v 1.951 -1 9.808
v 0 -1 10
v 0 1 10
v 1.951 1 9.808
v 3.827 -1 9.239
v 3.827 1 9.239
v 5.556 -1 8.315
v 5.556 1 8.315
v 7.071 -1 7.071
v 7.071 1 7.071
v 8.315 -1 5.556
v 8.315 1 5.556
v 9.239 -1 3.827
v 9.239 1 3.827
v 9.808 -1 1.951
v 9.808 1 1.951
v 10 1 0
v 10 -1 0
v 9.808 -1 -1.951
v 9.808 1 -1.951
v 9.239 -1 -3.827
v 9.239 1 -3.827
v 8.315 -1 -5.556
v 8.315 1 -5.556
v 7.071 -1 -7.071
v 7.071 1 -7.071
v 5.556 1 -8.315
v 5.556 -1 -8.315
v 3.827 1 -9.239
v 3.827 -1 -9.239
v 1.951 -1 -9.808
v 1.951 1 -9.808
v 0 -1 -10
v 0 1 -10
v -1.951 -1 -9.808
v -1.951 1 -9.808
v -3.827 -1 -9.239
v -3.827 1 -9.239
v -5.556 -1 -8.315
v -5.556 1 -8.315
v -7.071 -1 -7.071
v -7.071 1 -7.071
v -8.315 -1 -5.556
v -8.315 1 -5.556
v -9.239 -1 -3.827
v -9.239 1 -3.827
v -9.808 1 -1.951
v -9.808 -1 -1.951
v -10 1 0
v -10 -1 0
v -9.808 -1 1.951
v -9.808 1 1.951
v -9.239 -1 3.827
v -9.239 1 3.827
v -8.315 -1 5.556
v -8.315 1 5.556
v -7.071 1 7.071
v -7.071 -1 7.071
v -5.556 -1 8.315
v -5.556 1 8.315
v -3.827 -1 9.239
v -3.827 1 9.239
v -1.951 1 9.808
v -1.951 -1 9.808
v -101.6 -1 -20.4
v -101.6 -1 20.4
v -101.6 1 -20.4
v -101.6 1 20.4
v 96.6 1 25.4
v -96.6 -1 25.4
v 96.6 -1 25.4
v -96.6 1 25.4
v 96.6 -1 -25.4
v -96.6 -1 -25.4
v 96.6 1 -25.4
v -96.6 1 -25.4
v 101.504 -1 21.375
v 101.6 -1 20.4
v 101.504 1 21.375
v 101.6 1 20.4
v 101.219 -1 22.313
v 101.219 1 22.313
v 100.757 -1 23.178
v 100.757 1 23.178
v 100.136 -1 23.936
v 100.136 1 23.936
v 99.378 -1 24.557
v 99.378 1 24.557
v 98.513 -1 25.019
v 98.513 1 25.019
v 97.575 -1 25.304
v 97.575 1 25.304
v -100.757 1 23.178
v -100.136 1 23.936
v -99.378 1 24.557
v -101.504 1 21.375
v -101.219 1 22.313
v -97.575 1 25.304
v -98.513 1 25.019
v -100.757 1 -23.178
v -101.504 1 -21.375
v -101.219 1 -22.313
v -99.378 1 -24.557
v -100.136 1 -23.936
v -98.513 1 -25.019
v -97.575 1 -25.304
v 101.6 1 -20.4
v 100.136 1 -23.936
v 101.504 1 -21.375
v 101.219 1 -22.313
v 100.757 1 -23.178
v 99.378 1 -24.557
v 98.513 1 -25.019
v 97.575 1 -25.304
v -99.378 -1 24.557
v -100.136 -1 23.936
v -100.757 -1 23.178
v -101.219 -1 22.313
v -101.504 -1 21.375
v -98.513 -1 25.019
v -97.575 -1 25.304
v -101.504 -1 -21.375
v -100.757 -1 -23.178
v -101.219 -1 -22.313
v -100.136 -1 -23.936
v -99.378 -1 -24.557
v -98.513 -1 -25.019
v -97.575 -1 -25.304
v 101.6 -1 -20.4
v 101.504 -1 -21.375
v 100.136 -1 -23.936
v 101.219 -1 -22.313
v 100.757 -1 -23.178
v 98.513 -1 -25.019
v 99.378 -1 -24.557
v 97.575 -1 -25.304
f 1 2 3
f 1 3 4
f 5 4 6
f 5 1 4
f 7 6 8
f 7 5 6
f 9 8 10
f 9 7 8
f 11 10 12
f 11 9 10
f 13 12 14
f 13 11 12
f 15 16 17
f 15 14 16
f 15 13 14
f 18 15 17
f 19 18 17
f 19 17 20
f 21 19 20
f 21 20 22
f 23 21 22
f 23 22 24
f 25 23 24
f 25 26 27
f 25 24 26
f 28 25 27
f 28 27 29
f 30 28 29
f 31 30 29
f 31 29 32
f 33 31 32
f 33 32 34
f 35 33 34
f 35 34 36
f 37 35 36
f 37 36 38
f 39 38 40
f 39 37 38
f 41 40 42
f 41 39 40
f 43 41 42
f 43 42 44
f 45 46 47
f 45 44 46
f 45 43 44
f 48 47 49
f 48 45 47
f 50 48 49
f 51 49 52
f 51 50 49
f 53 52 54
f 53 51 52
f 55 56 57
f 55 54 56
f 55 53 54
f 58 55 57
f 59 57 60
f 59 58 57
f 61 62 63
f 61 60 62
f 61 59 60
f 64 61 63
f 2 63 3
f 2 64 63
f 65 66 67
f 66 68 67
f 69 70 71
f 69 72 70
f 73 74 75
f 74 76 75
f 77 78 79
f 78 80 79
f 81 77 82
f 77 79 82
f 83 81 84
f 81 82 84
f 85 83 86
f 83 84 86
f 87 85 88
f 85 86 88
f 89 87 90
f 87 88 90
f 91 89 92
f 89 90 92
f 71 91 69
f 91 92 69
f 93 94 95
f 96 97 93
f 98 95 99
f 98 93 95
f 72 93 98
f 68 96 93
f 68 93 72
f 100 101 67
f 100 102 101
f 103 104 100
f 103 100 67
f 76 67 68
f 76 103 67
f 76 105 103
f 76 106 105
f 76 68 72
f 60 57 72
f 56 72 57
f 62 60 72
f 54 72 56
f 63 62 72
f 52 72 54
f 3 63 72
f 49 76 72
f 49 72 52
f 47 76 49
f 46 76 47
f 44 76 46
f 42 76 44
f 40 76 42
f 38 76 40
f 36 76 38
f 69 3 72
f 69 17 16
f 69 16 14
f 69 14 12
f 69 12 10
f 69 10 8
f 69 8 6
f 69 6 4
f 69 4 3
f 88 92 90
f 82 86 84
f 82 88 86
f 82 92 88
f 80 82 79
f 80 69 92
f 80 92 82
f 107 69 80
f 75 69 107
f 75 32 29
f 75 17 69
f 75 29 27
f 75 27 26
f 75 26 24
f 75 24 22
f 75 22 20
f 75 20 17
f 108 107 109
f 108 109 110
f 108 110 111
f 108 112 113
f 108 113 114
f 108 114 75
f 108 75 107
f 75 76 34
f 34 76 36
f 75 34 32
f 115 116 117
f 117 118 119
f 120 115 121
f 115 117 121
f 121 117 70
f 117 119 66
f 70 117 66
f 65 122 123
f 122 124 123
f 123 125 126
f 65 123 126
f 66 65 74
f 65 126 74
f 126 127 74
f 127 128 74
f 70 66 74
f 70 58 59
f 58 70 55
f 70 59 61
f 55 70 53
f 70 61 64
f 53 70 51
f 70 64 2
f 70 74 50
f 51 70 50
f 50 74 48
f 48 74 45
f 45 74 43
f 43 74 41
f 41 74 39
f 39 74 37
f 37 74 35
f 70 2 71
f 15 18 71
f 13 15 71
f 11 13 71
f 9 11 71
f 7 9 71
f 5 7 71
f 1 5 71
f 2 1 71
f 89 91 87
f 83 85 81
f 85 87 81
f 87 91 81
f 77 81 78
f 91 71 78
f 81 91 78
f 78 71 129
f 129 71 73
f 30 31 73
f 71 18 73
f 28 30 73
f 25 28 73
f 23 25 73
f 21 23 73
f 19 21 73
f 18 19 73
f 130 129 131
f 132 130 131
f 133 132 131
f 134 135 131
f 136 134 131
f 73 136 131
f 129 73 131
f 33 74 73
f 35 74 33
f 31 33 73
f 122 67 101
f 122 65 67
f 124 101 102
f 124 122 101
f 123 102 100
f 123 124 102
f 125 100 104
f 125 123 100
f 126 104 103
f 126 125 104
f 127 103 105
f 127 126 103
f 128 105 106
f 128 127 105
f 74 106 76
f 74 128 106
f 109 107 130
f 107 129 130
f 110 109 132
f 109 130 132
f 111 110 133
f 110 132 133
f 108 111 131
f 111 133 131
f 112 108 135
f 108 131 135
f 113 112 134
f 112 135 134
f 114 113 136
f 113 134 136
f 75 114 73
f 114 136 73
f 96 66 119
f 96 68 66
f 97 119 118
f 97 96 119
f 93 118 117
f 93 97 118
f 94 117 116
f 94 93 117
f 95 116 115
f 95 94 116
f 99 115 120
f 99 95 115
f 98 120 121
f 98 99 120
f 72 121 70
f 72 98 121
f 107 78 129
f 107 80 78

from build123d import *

# Parameters (mm, degrees)
SKETCH2_W               = 203.2
SKETCH2_H               = 50.8
BOSS_EXTRUDE1_DEPTH     = 1
FILLET1_R               = 5
CUT_EXTRUDE1_DEPTH      = 105.731657105
CUT_EXTRUDE1_DEPTH_BACK = 105.731657105
SKETCH3_R               = 10


with BuildPart() as part:
    # Sketch2 → Boss-Extrude1 (new, symmetric)
    with BuildSketch(Plane(origin=(0, 0, 0), x_dir=(1, 0, 0), z_dir=(0, 1, 0))):
        Rectangle(SKETCH2_W, SKETCH2_H)
    extrude(amount=BOSS_EXTRUDE1_DEPTH, both=True)

    # Fillet1
    fillet1_edges = [part.edges().sort_by_distance(p)[0] for p in [
        (101.6, 0, 25.4),
        (-101.6, 0, 25.4),
        (-101.6, 0, -25.4),
        (101.6, 0, -25.4),
    ]]
    fillet(fillet1_edges, radius=FILLET1_R)

    # Sketch3 → Cut-Extrude1 (cut, two sides: drawn at the far end of the back side and taken through both)
    with BuildSketch(Plane(origin=(0, 0, 0), x_dir=(1, 0, 0), z_dir=(0, 1, 0)).offset(-CUT_EXTRUDE1_DEPTH_BACK)):
        with Locations(Location((0, 0, 0), (0, 0, 270))):
            Circle(SKETCH3_R)
    extrude(amount=CUT_EXTRUDE1_DEPTH + CUT_EXTRUDE1_DEPTH_BACK, mode=Mode.SUBTRACT)


solid = part.part
